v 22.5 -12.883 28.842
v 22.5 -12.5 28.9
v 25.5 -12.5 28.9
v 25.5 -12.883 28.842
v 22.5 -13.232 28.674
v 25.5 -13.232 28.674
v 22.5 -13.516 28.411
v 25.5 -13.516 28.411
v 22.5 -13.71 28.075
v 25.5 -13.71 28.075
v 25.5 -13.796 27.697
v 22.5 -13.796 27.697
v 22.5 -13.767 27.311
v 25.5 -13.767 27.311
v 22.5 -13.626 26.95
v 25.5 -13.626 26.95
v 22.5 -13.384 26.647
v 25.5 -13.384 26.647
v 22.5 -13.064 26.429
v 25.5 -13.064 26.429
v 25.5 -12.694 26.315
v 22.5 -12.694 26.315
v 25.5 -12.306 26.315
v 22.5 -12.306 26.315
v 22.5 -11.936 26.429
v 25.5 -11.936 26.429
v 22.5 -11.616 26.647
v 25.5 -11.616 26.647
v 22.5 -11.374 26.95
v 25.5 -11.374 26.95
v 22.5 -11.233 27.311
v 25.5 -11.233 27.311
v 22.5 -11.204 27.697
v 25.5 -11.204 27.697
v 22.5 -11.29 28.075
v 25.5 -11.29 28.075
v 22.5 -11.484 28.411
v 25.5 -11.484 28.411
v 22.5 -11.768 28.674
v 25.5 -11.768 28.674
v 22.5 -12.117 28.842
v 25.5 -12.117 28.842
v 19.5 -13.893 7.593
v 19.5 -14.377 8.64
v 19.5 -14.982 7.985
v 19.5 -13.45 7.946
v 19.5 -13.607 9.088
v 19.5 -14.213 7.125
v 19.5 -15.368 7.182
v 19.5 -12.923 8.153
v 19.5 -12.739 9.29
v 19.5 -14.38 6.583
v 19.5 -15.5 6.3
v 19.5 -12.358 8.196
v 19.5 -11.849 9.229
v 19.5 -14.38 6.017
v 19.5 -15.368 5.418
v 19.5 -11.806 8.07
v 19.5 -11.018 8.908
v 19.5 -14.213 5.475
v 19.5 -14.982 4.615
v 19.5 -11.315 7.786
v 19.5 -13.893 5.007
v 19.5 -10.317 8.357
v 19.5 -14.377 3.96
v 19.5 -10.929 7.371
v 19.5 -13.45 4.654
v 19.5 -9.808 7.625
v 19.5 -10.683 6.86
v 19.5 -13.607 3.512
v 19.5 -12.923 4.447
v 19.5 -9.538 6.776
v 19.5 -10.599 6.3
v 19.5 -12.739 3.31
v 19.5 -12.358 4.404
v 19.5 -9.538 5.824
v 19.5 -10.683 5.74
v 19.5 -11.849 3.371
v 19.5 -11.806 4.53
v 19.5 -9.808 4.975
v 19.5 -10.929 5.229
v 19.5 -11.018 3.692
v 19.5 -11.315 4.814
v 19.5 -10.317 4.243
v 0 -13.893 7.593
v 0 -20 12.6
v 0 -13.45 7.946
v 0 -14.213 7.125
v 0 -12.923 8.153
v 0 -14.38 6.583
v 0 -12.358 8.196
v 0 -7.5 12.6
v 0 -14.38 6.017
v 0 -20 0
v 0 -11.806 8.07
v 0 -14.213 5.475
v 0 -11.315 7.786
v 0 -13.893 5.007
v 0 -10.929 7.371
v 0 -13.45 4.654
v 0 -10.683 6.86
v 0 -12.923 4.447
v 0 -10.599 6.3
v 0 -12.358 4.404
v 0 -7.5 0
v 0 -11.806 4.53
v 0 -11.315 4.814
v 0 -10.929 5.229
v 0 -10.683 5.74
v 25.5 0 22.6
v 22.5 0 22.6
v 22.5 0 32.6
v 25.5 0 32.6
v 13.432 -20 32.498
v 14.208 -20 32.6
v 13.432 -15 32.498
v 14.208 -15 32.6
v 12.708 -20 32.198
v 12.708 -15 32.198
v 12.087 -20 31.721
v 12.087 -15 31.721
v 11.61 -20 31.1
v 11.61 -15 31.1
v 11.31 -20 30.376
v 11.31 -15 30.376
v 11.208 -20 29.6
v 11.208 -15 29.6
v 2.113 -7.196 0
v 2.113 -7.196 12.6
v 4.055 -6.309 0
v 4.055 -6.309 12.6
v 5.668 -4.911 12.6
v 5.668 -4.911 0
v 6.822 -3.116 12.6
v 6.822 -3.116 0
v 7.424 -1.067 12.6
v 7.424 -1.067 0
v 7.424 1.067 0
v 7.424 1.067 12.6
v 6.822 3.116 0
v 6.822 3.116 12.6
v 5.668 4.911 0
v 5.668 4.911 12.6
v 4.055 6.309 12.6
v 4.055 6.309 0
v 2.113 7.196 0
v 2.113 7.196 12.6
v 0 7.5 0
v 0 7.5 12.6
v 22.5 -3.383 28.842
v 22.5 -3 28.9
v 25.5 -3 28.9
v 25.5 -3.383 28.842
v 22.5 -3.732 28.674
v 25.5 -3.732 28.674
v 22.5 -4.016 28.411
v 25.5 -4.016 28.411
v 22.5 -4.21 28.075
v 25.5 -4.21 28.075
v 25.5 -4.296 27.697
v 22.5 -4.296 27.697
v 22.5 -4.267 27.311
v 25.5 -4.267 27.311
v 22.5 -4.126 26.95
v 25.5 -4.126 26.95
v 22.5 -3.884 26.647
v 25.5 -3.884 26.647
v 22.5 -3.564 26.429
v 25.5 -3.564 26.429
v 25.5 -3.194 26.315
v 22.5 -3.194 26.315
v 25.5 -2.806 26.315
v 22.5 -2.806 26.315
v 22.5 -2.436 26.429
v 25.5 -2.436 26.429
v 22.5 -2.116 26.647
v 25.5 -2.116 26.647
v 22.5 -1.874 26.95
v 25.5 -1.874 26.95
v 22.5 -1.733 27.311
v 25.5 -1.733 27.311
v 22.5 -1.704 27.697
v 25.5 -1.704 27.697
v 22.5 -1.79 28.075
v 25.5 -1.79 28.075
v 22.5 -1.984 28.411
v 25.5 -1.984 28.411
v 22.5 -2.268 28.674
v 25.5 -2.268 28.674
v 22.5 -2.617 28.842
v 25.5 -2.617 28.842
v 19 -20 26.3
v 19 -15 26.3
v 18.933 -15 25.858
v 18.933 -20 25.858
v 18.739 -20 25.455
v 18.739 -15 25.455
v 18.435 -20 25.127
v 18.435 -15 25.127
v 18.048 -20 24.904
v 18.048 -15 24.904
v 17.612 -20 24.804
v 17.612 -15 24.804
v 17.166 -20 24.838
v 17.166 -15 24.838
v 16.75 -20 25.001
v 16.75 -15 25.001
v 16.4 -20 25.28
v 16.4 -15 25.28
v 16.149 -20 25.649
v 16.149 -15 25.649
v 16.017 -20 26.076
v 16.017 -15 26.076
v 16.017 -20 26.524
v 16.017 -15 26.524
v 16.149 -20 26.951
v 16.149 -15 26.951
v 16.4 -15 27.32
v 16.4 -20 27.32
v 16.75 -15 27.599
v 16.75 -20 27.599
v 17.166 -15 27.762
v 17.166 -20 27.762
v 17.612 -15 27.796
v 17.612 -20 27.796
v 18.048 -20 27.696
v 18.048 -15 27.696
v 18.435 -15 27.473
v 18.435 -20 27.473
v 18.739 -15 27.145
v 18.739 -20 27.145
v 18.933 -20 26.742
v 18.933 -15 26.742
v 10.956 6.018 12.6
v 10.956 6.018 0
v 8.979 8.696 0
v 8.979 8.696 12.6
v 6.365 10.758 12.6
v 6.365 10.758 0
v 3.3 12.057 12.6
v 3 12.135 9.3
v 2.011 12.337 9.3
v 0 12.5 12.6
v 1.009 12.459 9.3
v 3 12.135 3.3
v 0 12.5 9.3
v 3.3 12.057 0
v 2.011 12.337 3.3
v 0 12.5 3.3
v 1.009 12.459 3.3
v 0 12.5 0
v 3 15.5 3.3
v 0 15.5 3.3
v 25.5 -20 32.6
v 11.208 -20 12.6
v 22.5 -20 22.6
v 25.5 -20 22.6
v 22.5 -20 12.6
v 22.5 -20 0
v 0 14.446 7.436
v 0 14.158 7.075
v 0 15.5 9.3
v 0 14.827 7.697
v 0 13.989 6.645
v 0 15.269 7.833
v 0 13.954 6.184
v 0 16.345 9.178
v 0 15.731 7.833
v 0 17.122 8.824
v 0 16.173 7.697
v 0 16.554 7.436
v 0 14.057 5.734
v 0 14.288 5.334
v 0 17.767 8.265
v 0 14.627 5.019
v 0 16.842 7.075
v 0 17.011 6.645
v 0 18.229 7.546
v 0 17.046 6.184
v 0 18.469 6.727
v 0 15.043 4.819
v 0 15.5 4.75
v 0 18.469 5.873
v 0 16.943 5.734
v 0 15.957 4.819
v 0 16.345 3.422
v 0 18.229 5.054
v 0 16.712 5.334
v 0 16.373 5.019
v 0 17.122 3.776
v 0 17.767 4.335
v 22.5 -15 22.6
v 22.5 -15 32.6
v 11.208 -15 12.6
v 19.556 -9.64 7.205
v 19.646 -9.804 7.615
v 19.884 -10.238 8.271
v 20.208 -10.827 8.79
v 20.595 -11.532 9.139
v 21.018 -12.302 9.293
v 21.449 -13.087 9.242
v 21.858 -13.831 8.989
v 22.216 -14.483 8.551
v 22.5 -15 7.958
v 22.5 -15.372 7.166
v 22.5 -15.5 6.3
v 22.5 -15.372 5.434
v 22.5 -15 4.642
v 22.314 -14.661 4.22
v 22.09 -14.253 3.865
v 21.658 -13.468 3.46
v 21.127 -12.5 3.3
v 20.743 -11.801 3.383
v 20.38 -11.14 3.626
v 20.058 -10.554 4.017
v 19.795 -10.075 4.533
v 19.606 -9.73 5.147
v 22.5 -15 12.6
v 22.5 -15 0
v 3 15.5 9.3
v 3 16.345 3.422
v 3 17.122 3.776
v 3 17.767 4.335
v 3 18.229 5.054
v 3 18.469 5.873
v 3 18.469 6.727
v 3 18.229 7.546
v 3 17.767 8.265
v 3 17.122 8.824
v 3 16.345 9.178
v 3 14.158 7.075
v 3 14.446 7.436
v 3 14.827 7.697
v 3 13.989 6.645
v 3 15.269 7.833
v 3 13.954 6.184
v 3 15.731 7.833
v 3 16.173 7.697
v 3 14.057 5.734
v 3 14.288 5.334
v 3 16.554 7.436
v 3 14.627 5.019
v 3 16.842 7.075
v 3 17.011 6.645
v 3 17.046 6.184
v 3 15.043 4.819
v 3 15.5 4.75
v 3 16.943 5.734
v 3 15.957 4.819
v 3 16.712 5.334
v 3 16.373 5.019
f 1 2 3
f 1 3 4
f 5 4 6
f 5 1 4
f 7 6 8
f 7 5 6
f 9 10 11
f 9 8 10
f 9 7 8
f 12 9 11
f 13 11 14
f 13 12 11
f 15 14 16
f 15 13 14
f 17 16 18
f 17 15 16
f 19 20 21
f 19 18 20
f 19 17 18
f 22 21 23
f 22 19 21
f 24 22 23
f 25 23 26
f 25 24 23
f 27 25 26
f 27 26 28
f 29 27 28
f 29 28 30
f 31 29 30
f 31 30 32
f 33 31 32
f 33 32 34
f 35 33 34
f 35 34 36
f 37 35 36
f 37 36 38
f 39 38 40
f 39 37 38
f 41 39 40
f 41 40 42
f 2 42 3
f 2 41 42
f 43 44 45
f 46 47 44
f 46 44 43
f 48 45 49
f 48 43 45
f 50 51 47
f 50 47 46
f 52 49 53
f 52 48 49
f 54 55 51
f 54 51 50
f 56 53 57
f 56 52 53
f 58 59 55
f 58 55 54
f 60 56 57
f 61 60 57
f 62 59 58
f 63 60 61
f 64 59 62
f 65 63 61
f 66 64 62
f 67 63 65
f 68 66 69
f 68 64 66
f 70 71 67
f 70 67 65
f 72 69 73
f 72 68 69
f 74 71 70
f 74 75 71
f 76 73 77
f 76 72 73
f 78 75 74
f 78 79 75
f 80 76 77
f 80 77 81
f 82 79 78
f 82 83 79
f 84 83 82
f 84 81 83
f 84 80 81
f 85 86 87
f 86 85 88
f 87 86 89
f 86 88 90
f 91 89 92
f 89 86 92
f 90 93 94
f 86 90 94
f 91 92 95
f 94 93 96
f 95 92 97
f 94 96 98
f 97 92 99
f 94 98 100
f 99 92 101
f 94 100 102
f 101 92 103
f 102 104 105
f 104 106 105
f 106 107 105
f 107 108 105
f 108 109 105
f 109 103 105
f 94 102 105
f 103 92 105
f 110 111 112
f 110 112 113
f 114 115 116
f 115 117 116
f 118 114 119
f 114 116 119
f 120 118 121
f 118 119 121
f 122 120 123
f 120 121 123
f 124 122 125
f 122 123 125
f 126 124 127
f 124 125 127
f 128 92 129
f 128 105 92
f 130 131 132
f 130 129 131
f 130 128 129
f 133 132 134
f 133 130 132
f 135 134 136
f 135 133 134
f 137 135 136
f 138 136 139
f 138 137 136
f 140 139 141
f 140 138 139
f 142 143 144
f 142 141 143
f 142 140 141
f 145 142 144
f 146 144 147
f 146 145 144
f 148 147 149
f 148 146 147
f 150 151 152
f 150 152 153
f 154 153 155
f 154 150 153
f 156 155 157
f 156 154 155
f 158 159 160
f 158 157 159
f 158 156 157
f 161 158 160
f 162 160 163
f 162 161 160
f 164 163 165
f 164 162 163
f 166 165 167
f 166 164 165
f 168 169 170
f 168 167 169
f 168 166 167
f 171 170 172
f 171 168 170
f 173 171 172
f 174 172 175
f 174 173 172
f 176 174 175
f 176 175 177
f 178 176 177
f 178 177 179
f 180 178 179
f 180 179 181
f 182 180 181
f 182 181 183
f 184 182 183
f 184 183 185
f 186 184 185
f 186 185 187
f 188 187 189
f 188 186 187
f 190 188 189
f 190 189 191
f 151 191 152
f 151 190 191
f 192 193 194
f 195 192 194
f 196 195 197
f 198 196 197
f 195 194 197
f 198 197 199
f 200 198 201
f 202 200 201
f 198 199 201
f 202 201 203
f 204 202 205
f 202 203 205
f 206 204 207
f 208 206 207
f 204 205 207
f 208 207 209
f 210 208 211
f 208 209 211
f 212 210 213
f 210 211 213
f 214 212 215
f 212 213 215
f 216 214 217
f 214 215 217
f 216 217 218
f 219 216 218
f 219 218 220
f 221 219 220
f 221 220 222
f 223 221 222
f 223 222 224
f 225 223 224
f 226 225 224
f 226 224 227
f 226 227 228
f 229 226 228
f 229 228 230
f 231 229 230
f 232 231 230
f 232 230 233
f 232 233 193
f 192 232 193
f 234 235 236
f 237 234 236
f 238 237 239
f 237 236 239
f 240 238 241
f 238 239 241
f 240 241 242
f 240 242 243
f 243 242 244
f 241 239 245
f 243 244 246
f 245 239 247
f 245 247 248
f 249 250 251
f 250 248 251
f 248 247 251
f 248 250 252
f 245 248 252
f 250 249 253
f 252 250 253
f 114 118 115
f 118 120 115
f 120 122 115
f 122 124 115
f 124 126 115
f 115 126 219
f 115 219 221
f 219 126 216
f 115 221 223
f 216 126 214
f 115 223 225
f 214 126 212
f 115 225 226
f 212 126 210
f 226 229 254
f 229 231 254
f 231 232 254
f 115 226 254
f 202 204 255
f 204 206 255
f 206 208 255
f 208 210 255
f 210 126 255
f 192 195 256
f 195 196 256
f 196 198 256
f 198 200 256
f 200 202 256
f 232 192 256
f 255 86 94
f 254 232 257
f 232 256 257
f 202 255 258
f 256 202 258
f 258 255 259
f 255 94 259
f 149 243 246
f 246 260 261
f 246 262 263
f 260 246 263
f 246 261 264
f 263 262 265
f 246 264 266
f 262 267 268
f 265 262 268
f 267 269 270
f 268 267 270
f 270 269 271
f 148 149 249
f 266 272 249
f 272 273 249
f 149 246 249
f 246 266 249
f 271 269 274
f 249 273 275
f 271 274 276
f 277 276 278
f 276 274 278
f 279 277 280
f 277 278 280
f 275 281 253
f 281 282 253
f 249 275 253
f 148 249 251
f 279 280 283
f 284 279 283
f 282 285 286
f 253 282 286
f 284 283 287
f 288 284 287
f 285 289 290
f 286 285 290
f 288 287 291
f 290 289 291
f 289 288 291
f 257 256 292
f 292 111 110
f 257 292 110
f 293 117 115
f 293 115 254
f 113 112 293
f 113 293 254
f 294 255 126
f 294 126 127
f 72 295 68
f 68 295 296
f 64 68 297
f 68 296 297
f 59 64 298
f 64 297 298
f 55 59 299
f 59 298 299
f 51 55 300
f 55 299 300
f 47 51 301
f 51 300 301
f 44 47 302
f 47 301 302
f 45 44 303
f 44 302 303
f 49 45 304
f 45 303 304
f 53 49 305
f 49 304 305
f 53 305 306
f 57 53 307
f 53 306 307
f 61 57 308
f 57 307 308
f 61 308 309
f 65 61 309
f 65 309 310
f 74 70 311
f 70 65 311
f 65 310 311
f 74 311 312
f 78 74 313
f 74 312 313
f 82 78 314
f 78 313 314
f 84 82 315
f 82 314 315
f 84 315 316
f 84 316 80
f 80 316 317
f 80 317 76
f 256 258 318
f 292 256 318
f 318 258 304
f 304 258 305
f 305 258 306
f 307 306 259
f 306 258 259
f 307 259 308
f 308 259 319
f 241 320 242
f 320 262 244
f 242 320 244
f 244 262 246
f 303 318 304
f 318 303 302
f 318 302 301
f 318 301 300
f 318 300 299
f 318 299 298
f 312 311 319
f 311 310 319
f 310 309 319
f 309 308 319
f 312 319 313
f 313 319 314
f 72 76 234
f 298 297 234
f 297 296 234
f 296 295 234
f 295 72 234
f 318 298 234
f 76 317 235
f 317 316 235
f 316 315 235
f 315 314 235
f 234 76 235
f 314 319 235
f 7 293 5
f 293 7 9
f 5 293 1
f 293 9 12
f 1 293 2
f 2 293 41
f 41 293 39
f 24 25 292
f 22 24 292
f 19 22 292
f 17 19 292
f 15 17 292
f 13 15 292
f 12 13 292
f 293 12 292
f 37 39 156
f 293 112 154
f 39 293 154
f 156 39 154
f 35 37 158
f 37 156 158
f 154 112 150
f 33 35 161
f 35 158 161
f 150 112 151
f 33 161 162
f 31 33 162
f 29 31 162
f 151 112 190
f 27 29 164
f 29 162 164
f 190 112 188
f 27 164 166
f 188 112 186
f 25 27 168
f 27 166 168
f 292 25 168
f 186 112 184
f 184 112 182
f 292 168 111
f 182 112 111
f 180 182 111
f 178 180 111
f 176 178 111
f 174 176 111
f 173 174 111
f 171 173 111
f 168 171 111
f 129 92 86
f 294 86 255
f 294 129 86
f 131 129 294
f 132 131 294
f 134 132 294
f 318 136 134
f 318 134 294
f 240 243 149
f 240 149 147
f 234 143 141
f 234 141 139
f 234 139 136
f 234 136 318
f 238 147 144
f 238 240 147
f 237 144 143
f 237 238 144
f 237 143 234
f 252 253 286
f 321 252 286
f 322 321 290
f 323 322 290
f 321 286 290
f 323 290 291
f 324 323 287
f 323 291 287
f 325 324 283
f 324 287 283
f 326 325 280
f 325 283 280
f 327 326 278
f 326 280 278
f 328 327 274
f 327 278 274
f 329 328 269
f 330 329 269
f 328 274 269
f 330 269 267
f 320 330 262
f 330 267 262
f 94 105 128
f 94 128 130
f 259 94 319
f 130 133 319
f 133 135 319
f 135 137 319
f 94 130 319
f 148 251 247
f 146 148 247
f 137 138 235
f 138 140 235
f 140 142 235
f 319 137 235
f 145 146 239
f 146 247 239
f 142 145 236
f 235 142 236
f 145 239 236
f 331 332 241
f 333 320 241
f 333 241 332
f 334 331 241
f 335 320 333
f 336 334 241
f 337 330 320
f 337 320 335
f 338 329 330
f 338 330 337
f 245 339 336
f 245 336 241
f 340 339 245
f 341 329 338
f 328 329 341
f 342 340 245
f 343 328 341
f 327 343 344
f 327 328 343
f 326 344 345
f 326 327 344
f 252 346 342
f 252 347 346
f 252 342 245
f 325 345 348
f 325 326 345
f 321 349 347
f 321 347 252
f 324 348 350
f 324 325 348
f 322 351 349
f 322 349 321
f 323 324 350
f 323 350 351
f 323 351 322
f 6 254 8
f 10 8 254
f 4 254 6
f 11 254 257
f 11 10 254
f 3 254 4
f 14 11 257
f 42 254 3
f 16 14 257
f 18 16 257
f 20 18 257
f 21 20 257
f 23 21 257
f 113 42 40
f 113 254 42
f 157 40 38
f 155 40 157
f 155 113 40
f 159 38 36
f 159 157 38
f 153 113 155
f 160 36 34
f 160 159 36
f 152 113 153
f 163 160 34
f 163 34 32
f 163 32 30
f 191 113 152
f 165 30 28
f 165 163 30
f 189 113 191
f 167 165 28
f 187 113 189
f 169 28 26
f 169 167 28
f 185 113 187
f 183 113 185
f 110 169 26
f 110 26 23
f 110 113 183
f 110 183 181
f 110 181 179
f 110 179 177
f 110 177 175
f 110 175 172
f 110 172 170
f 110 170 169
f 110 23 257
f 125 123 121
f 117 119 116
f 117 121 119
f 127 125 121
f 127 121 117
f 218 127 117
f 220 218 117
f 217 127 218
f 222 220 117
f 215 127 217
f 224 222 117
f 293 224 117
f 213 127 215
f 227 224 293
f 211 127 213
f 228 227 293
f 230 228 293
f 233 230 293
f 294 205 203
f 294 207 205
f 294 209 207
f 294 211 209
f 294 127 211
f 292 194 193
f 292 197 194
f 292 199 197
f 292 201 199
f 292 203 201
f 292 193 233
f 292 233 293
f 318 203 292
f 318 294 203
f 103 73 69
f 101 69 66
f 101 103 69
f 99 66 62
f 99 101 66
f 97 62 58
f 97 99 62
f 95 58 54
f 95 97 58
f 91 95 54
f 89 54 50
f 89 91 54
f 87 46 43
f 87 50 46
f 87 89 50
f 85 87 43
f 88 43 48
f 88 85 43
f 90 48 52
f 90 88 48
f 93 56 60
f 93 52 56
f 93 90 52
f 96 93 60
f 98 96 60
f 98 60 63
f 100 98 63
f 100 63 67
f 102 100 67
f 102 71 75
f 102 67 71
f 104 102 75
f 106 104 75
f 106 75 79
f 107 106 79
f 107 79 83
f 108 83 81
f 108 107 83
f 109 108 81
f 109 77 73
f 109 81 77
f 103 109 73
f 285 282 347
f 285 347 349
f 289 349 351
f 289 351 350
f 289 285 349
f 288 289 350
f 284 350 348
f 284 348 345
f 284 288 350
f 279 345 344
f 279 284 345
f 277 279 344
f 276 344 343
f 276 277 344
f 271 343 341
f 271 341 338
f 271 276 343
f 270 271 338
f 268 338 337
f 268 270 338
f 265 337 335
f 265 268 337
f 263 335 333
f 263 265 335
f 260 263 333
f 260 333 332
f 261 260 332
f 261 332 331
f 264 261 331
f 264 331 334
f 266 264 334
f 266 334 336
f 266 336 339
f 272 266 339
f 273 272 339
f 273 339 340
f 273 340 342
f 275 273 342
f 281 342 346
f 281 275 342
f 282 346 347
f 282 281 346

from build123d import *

# Parameters (mm, degrees)
SKETCH_1_R          = 7.5
EXTRUDE_1_DEPTH     = 12.6
SKETCH_2_W          = 11.291748881
SKETCH_2_H          = 5
EXTRUDE_2_DEPTH     = 32.6
SKETCH_3_R          = 1.5
CUT_EXTRUDE_1_DEPTH = 45.373528145
FILLET_1_R          = 3
SKETCH_4_W          = 3
SKETCH_4_H          = 10
EXTRUDE_3_DEPTH     = 20
SKETCH_5_R          = 1.3
CUT_EXTRUDE_2_DEPTH = 46.967488511
SKETCH_6_W          = 35.293936169
SKETCH_6_H          = 34.958158763
CUT_EXTRUDE_3_DEPTH = 46.967488511
EXTRUDE_4_OUTLINE_R = 1.55
EXTRUDE_4_DEPTH     = 3
SKETCH_8_R          = 1.900956558
CUT_EXTRUDE_4_DEPTH = 46.967488511
SKETCH_9_R          = 3
CUT_EXTRUDE_5_DEPTH = 3


# Read off the part's stored shape, not the designer's step: 凸台-拉伸4
with BuildPart() as part:
    # 草图1 → 凸台-拉伸1 (new body)
    with BuildSketch(Plane.XY):
        with BuildLine():
            Line((-10.956194261, 6.017624724), (-22.5, -15))
            Line((-22.5, -15), (-22.5, -20))
            Line((-22.5, -20), (22.5, -20))
            Line((22.5, -20), (22.5, -15))
            Line((22.5, -15), (10.956194261, 6.017624724))
            ThreePointArc((10.956194261, 6.017624724), (0, 12.5), (-10.956194261, 6.017624724))
        make_face()
        Circle(SKETCH_1_R, mode=Mode.SUBTRACT)
    extrude(amount=EXTRUDE_1_DEPTH)

    # 草图2 → 凸台-拉伸2 (add)
    with BuildSketch(Plane.XY):
        with Locations((-16.854125559, -17.5)):
            Rectangle(SKETCH_2_W, SKETCH_2_H)
        with Locations((16.854125559, -17.5)):
            Rectangle(SKETCH_2_W, SKETCH_2_H)
    extrude(amount=EXTRUDE_2_DEPTH)

    # 草图3 → 切除-拉伸1 (cut, through all)
    with BuildSketch(Plane(origin=(0, 0, 0), x_dir=(1, 0, 0), z_dir=(0, 1, 0))):
        with Locations(Location((-17.5, -26.3, 0), (0, 0, 270))):
            Circle(SKETCH_3_R)
        with Locations((17.5, -26.3)):
            Circle(SKETCH_3_R)
    extrude(amount=-CUT_EXTRUDE_1_DEPTH, mode=Mode.SUBTRACT)

    # 圆角1
    fillet_1_edges = [part.edges().sort_by_distance(p)[0] for p in [
        (-22.5, -17.5, 32.6),
        (-11.208251119, -17.5, 32.6),
        (11.208251119, -17.5, 32.6),
    ]]
    fillet(fillet_1_edges, radius=FILLET_1_R)

    # 草图4 → 凸台-拉伸3 (add, through all)
    with BuildSketch(Plane(origin=(0, 0, 0), x_dir=(1, 0, 0), z_dir=(0, 1, 0))):
        with Locations((24, -27.6)):
            Rectangle(SKETCH_4_W, SKETCH_4_H)
    extrude(amount=-EXTRUDE_3_DEPTH)

    # 草图5 → 切除-拉伸2 (cut, through all)
    with BuildSketch(Plane(origin=(0, 0, 0), x_dir=(0, 0, -1), z_dir=(1, 0, 0))):
        with Locations(Location((-27.6, -3, 0), (0, 0, 180))):
            Circle(SKETCH_5_R)
        with Locations(Location((-27.6, -12.5, 0), (0, 0, 180))):
            Circle(SKETCH_5_R)
    extrude(amount=CUT_EXTRUDE_2_DEPTH, mode=Mode.SUBTRACT)

    # 草图6 → 切除-拉伸3 (cut, through all)
    with BuildSketch(Plane(origin=(0, 0, 0), x_dir=(0, 0, -1), z_dir=(1, 0, 0))):
        with Locations((-16.337308601, -3.7126914)):
            Rectangle(SKETCH_6_W, SKETCH_6_H)
    extrude(amount=-CUT_EXTRUDE_3_DEPTH, mode=Mode.SUBTRACT)

    # 凸台-拉伸4 outline → 凸台-拉伸4 (add)
    with BuildSketch(Plane(origin=(0, 0, 0), x_dir=(0, 0, -1), z_dir=(1, 0, 0))):
        with BuildLine():
            Line((-9.3, 15.5), (-9.3, 9.152926334))
            Line((-9.3, 9.152926334), (-3.3, 9.152926334))
            Line((-3.3, 9.152926334), (-3.3, 15.5))
            ThreePointArc((-3.3, 15.5), (-6.3, 18.5), (-9.3, 15.5))
        make_face()
        with Locations((-6.3, 15.5)):
            Circle(EXTRUDE_4_OUTLINE_R, mode=Mode.SUBTRACT)
    extrude(amount=EXTRUDE_4_DEPTH)

    # 草图8 → 切除-拉伸4 (cut, through all)
    with BuildSketch(Plane(origin=(0, 0, 0), x_dir=(0, 0, -1), z_dir=(1, 0, 0))):
        with Locations(Location((-6.3, -12.5, 0), (0, 0, 90))):
            Circle(SKETCH_8_R)
    extrude(amount=CUT_EXTRUDE_4_DEPTH, mode=Mode.SUBTRACT)

    # 草图9 → 切除-拉伸5 (cut)
    with BuildSketch(Plane(origin=(22.5, 0, 0), x_dir=(0, 0, -1), z_dir=(1, 0, 0))):
        with Locations((-6.3, -12.5)):
            Circle(SKETCH_9_R)
    extrude(amount=-CUT_EXTRUDE_5_DEPTH, mode=Mode.SUBTRACT)


solid = part.part
